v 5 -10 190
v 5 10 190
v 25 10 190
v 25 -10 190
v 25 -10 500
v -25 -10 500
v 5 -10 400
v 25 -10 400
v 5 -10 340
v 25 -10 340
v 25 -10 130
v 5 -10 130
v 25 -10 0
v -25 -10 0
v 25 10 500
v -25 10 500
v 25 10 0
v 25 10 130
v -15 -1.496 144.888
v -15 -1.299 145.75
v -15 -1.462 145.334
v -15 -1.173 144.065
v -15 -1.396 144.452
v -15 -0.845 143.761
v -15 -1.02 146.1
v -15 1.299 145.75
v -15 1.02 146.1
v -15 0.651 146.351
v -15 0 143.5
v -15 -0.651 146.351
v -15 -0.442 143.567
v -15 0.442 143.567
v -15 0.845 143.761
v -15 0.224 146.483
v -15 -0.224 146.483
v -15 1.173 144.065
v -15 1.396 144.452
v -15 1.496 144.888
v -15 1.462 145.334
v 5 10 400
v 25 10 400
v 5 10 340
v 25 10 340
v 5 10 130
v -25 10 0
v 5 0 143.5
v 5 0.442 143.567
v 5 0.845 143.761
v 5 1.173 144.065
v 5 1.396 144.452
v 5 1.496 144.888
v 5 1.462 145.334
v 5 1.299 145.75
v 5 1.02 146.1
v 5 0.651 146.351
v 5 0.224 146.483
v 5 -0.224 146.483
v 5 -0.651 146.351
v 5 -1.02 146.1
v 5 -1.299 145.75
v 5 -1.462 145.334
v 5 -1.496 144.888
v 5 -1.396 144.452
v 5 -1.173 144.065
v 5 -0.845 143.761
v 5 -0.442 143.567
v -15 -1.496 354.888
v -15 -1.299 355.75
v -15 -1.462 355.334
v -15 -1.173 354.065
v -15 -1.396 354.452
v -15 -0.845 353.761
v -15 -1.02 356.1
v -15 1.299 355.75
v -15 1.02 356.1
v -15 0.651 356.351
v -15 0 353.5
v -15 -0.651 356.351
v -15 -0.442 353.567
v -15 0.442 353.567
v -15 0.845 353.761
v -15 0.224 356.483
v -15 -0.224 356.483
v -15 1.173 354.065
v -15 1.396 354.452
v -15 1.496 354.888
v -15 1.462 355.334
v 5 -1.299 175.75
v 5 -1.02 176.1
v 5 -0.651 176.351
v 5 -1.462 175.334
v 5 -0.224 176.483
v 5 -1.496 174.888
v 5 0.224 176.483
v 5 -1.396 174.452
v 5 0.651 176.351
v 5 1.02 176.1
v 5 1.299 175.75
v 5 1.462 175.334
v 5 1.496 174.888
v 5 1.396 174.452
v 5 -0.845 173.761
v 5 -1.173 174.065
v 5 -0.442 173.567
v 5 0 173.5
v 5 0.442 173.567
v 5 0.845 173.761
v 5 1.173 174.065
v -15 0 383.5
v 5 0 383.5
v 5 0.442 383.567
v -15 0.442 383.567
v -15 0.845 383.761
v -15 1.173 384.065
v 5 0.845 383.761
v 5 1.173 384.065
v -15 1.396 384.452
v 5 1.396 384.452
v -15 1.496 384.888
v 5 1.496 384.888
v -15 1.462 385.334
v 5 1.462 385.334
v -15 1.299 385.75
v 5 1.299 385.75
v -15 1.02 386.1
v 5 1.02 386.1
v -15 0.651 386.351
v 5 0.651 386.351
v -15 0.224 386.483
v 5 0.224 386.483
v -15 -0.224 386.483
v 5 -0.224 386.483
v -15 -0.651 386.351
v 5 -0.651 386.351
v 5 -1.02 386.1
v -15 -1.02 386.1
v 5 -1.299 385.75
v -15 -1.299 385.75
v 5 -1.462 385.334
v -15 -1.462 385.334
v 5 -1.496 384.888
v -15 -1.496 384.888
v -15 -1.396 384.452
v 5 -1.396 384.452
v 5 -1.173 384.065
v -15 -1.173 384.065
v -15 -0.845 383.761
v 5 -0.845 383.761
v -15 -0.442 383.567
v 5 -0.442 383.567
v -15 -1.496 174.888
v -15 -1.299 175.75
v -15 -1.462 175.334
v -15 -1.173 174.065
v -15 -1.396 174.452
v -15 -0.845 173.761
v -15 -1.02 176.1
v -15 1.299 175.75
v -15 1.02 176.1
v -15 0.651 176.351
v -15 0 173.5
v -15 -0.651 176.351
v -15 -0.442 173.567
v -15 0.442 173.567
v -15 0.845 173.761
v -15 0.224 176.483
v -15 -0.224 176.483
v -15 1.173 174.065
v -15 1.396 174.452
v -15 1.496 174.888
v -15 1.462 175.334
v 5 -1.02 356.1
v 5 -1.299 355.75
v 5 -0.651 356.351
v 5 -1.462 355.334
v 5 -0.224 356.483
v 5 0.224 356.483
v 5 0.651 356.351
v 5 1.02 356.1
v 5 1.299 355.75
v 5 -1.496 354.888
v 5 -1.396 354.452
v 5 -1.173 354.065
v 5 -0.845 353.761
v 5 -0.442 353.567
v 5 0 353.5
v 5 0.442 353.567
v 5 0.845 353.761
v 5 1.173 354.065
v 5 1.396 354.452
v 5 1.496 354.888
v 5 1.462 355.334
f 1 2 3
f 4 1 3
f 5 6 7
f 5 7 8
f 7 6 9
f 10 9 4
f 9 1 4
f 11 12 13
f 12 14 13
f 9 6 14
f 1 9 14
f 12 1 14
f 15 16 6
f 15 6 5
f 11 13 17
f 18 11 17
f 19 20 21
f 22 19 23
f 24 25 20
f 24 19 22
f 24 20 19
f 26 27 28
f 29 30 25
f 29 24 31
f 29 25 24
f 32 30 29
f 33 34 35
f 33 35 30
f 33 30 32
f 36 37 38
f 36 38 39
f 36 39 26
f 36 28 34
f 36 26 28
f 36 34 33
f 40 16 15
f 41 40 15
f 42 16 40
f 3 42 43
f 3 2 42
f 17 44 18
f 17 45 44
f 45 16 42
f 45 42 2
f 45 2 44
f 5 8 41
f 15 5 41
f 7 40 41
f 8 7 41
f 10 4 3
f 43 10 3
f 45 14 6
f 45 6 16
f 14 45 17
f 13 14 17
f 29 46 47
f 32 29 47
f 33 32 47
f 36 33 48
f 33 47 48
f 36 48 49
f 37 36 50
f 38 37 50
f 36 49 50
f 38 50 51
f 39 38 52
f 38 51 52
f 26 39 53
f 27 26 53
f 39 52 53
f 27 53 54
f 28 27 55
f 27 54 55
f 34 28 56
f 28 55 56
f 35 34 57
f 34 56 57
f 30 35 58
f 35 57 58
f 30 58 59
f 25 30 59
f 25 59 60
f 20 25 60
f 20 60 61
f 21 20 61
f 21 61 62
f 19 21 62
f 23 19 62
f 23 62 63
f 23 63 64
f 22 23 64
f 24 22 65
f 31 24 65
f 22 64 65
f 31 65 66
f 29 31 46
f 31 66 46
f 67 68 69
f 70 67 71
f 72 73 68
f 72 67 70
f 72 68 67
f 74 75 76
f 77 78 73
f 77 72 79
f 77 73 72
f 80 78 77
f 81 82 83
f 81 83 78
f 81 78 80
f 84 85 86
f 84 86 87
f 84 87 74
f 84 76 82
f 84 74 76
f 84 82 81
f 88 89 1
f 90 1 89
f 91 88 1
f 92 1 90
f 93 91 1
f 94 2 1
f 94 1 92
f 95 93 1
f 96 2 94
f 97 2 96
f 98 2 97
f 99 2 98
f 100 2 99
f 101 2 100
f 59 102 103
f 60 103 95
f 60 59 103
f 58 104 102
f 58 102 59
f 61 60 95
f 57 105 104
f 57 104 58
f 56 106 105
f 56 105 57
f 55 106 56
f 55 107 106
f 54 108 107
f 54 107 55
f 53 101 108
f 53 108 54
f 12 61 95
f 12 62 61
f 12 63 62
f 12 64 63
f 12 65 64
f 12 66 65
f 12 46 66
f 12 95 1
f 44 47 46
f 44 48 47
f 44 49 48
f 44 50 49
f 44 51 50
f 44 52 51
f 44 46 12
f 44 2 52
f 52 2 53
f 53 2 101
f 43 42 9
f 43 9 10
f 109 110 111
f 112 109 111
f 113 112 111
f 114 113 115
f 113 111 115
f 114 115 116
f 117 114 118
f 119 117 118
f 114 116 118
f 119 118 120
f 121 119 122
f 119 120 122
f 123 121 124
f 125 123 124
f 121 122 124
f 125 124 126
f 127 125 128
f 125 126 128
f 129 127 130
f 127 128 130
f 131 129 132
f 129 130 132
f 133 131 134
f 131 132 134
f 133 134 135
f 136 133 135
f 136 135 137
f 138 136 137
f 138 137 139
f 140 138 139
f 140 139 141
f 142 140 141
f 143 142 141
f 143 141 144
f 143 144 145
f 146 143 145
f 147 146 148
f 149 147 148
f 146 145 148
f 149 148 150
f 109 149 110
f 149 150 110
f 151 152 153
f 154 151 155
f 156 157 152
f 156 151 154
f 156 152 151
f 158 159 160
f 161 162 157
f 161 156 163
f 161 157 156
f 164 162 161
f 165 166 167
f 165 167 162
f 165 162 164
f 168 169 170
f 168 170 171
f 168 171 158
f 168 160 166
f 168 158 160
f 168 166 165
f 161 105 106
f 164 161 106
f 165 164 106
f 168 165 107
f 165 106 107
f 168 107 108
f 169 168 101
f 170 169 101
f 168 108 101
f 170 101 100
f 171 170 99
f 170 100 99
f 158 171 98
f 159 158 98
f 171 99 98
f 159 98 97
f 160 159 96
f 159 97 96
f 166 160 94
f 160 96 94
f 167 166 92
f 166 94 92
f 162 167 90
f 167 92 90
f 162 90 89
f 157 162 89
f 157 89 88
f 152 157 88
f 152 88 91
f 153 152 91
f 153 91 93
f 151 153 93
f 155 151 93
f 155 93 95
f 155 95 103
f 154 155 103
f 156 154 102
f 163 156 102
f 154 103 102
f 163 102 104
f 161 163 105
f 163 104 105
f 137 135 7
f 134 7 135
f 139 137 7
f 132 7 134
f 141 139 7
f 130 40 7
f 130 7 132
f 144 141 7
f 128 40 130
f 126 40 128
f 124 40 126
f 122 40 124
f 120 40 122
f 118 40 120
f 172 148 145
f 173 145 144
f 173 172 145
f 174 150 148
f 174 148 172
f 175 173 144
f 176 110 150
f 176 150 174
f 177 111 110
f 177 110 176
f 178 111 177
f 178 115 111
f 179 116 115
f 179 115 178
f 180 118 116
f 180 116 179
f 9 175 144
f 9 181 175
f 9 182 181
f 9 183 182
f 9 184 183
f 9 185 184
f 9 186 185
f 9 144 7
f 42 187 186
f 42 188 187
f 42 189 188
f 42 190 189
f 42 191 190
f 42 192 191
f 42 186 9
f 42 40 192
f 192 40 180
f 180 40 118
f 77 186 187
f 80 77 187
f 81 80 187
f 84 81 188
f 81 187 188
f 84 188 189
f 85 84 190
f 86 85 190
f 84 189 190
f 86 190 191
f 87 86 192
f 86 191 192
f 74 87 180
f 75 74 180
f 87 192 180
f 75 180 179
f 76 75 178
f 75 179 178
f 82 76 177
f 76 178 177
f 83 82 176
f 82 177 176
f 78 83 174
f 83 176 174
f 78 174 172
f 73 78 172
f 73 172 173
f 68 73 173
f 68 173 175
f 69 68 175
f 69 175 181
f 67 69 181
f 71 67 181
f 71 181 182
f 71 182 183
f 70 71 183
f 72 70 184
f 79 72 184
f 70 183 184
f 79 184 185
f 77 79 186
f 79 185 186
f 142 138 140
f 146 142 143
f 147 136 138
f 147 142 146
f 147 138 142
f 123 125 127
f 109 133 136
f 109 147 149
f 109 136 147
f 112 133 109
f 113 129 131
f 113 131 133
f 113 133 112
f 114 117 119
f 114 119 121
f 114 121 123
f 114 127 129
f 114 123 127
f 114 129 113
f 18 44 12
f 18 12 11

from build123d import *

# Parameters (mm, degrees)
SKIZZE1_W                       = 50
SKIZZE1_H                       = 20
AUFSATZ_LINEAR_AUSTRAGEN1_DEPTH = 500
SKIZZE2_W                       = 20
SKIZZE2_H                       = 60
SCHNITT_LINEAR_AUSTRAGEN1_DEPTH = 502.023951523
SKIZZE3_R                       = 1.5
SCHNITT_LINEAR_AUSTRAGEN2_DEPTH = 20


with BuildPart() as part:
    # Skizze1 → Aufsatz-Linear austragen1 (new body)
    with BuildSketch(Plane.XY):
        Rectangle(SKIZZE1_W, SKIZZE1_H)
    extrude(amount=AUFSATZ_LINEAR_AUSTRAGEN1_DEPTH)

    # Skizze2 → Schnitt-Linear austragen1 (cut, through all)
    with BuildSketch(Plane(origin=(0, 10, 0), x_dir=(1, 0, 0), z_dir=(0, 1, 0))):
        with Locations((15, -370)):
            Rectangle(SKIZZE2_W, SKIZZE2_H)
        with Locations((15, -160)):
            Rectangle(SKIZZE2_W, SKIZZE2_H)
    extrude(amount=-SCHNITT_LINEAR_AUSTRAGEN1_DEPTH, mode=Mode.SUBTRACT)

    # Skizze3 → Schnitt-Linear austragen2 (cut)
    with BuildSketch(Plane(origin=(5, 0, 0), x_dir=(0, 0, -1), z_dir=(1, 0, 0))):
        with Locations((-385, 0)):
            Circle(SKIZZE3_R)
        with Locations((-355, 0)):
            Circle(SKIZZE3_R)
        with Locations((-175, 0)):
            Circle(SKIZZE3_R)
        with Locations((-145, 0)):
            Circle(SKIZZE3_R)
    extrude(amount=-SCHNITT_LINEAR_AUSTRAGEN2_DEPTH, mode=Mode.SUBTRACT)


solid = part.part
